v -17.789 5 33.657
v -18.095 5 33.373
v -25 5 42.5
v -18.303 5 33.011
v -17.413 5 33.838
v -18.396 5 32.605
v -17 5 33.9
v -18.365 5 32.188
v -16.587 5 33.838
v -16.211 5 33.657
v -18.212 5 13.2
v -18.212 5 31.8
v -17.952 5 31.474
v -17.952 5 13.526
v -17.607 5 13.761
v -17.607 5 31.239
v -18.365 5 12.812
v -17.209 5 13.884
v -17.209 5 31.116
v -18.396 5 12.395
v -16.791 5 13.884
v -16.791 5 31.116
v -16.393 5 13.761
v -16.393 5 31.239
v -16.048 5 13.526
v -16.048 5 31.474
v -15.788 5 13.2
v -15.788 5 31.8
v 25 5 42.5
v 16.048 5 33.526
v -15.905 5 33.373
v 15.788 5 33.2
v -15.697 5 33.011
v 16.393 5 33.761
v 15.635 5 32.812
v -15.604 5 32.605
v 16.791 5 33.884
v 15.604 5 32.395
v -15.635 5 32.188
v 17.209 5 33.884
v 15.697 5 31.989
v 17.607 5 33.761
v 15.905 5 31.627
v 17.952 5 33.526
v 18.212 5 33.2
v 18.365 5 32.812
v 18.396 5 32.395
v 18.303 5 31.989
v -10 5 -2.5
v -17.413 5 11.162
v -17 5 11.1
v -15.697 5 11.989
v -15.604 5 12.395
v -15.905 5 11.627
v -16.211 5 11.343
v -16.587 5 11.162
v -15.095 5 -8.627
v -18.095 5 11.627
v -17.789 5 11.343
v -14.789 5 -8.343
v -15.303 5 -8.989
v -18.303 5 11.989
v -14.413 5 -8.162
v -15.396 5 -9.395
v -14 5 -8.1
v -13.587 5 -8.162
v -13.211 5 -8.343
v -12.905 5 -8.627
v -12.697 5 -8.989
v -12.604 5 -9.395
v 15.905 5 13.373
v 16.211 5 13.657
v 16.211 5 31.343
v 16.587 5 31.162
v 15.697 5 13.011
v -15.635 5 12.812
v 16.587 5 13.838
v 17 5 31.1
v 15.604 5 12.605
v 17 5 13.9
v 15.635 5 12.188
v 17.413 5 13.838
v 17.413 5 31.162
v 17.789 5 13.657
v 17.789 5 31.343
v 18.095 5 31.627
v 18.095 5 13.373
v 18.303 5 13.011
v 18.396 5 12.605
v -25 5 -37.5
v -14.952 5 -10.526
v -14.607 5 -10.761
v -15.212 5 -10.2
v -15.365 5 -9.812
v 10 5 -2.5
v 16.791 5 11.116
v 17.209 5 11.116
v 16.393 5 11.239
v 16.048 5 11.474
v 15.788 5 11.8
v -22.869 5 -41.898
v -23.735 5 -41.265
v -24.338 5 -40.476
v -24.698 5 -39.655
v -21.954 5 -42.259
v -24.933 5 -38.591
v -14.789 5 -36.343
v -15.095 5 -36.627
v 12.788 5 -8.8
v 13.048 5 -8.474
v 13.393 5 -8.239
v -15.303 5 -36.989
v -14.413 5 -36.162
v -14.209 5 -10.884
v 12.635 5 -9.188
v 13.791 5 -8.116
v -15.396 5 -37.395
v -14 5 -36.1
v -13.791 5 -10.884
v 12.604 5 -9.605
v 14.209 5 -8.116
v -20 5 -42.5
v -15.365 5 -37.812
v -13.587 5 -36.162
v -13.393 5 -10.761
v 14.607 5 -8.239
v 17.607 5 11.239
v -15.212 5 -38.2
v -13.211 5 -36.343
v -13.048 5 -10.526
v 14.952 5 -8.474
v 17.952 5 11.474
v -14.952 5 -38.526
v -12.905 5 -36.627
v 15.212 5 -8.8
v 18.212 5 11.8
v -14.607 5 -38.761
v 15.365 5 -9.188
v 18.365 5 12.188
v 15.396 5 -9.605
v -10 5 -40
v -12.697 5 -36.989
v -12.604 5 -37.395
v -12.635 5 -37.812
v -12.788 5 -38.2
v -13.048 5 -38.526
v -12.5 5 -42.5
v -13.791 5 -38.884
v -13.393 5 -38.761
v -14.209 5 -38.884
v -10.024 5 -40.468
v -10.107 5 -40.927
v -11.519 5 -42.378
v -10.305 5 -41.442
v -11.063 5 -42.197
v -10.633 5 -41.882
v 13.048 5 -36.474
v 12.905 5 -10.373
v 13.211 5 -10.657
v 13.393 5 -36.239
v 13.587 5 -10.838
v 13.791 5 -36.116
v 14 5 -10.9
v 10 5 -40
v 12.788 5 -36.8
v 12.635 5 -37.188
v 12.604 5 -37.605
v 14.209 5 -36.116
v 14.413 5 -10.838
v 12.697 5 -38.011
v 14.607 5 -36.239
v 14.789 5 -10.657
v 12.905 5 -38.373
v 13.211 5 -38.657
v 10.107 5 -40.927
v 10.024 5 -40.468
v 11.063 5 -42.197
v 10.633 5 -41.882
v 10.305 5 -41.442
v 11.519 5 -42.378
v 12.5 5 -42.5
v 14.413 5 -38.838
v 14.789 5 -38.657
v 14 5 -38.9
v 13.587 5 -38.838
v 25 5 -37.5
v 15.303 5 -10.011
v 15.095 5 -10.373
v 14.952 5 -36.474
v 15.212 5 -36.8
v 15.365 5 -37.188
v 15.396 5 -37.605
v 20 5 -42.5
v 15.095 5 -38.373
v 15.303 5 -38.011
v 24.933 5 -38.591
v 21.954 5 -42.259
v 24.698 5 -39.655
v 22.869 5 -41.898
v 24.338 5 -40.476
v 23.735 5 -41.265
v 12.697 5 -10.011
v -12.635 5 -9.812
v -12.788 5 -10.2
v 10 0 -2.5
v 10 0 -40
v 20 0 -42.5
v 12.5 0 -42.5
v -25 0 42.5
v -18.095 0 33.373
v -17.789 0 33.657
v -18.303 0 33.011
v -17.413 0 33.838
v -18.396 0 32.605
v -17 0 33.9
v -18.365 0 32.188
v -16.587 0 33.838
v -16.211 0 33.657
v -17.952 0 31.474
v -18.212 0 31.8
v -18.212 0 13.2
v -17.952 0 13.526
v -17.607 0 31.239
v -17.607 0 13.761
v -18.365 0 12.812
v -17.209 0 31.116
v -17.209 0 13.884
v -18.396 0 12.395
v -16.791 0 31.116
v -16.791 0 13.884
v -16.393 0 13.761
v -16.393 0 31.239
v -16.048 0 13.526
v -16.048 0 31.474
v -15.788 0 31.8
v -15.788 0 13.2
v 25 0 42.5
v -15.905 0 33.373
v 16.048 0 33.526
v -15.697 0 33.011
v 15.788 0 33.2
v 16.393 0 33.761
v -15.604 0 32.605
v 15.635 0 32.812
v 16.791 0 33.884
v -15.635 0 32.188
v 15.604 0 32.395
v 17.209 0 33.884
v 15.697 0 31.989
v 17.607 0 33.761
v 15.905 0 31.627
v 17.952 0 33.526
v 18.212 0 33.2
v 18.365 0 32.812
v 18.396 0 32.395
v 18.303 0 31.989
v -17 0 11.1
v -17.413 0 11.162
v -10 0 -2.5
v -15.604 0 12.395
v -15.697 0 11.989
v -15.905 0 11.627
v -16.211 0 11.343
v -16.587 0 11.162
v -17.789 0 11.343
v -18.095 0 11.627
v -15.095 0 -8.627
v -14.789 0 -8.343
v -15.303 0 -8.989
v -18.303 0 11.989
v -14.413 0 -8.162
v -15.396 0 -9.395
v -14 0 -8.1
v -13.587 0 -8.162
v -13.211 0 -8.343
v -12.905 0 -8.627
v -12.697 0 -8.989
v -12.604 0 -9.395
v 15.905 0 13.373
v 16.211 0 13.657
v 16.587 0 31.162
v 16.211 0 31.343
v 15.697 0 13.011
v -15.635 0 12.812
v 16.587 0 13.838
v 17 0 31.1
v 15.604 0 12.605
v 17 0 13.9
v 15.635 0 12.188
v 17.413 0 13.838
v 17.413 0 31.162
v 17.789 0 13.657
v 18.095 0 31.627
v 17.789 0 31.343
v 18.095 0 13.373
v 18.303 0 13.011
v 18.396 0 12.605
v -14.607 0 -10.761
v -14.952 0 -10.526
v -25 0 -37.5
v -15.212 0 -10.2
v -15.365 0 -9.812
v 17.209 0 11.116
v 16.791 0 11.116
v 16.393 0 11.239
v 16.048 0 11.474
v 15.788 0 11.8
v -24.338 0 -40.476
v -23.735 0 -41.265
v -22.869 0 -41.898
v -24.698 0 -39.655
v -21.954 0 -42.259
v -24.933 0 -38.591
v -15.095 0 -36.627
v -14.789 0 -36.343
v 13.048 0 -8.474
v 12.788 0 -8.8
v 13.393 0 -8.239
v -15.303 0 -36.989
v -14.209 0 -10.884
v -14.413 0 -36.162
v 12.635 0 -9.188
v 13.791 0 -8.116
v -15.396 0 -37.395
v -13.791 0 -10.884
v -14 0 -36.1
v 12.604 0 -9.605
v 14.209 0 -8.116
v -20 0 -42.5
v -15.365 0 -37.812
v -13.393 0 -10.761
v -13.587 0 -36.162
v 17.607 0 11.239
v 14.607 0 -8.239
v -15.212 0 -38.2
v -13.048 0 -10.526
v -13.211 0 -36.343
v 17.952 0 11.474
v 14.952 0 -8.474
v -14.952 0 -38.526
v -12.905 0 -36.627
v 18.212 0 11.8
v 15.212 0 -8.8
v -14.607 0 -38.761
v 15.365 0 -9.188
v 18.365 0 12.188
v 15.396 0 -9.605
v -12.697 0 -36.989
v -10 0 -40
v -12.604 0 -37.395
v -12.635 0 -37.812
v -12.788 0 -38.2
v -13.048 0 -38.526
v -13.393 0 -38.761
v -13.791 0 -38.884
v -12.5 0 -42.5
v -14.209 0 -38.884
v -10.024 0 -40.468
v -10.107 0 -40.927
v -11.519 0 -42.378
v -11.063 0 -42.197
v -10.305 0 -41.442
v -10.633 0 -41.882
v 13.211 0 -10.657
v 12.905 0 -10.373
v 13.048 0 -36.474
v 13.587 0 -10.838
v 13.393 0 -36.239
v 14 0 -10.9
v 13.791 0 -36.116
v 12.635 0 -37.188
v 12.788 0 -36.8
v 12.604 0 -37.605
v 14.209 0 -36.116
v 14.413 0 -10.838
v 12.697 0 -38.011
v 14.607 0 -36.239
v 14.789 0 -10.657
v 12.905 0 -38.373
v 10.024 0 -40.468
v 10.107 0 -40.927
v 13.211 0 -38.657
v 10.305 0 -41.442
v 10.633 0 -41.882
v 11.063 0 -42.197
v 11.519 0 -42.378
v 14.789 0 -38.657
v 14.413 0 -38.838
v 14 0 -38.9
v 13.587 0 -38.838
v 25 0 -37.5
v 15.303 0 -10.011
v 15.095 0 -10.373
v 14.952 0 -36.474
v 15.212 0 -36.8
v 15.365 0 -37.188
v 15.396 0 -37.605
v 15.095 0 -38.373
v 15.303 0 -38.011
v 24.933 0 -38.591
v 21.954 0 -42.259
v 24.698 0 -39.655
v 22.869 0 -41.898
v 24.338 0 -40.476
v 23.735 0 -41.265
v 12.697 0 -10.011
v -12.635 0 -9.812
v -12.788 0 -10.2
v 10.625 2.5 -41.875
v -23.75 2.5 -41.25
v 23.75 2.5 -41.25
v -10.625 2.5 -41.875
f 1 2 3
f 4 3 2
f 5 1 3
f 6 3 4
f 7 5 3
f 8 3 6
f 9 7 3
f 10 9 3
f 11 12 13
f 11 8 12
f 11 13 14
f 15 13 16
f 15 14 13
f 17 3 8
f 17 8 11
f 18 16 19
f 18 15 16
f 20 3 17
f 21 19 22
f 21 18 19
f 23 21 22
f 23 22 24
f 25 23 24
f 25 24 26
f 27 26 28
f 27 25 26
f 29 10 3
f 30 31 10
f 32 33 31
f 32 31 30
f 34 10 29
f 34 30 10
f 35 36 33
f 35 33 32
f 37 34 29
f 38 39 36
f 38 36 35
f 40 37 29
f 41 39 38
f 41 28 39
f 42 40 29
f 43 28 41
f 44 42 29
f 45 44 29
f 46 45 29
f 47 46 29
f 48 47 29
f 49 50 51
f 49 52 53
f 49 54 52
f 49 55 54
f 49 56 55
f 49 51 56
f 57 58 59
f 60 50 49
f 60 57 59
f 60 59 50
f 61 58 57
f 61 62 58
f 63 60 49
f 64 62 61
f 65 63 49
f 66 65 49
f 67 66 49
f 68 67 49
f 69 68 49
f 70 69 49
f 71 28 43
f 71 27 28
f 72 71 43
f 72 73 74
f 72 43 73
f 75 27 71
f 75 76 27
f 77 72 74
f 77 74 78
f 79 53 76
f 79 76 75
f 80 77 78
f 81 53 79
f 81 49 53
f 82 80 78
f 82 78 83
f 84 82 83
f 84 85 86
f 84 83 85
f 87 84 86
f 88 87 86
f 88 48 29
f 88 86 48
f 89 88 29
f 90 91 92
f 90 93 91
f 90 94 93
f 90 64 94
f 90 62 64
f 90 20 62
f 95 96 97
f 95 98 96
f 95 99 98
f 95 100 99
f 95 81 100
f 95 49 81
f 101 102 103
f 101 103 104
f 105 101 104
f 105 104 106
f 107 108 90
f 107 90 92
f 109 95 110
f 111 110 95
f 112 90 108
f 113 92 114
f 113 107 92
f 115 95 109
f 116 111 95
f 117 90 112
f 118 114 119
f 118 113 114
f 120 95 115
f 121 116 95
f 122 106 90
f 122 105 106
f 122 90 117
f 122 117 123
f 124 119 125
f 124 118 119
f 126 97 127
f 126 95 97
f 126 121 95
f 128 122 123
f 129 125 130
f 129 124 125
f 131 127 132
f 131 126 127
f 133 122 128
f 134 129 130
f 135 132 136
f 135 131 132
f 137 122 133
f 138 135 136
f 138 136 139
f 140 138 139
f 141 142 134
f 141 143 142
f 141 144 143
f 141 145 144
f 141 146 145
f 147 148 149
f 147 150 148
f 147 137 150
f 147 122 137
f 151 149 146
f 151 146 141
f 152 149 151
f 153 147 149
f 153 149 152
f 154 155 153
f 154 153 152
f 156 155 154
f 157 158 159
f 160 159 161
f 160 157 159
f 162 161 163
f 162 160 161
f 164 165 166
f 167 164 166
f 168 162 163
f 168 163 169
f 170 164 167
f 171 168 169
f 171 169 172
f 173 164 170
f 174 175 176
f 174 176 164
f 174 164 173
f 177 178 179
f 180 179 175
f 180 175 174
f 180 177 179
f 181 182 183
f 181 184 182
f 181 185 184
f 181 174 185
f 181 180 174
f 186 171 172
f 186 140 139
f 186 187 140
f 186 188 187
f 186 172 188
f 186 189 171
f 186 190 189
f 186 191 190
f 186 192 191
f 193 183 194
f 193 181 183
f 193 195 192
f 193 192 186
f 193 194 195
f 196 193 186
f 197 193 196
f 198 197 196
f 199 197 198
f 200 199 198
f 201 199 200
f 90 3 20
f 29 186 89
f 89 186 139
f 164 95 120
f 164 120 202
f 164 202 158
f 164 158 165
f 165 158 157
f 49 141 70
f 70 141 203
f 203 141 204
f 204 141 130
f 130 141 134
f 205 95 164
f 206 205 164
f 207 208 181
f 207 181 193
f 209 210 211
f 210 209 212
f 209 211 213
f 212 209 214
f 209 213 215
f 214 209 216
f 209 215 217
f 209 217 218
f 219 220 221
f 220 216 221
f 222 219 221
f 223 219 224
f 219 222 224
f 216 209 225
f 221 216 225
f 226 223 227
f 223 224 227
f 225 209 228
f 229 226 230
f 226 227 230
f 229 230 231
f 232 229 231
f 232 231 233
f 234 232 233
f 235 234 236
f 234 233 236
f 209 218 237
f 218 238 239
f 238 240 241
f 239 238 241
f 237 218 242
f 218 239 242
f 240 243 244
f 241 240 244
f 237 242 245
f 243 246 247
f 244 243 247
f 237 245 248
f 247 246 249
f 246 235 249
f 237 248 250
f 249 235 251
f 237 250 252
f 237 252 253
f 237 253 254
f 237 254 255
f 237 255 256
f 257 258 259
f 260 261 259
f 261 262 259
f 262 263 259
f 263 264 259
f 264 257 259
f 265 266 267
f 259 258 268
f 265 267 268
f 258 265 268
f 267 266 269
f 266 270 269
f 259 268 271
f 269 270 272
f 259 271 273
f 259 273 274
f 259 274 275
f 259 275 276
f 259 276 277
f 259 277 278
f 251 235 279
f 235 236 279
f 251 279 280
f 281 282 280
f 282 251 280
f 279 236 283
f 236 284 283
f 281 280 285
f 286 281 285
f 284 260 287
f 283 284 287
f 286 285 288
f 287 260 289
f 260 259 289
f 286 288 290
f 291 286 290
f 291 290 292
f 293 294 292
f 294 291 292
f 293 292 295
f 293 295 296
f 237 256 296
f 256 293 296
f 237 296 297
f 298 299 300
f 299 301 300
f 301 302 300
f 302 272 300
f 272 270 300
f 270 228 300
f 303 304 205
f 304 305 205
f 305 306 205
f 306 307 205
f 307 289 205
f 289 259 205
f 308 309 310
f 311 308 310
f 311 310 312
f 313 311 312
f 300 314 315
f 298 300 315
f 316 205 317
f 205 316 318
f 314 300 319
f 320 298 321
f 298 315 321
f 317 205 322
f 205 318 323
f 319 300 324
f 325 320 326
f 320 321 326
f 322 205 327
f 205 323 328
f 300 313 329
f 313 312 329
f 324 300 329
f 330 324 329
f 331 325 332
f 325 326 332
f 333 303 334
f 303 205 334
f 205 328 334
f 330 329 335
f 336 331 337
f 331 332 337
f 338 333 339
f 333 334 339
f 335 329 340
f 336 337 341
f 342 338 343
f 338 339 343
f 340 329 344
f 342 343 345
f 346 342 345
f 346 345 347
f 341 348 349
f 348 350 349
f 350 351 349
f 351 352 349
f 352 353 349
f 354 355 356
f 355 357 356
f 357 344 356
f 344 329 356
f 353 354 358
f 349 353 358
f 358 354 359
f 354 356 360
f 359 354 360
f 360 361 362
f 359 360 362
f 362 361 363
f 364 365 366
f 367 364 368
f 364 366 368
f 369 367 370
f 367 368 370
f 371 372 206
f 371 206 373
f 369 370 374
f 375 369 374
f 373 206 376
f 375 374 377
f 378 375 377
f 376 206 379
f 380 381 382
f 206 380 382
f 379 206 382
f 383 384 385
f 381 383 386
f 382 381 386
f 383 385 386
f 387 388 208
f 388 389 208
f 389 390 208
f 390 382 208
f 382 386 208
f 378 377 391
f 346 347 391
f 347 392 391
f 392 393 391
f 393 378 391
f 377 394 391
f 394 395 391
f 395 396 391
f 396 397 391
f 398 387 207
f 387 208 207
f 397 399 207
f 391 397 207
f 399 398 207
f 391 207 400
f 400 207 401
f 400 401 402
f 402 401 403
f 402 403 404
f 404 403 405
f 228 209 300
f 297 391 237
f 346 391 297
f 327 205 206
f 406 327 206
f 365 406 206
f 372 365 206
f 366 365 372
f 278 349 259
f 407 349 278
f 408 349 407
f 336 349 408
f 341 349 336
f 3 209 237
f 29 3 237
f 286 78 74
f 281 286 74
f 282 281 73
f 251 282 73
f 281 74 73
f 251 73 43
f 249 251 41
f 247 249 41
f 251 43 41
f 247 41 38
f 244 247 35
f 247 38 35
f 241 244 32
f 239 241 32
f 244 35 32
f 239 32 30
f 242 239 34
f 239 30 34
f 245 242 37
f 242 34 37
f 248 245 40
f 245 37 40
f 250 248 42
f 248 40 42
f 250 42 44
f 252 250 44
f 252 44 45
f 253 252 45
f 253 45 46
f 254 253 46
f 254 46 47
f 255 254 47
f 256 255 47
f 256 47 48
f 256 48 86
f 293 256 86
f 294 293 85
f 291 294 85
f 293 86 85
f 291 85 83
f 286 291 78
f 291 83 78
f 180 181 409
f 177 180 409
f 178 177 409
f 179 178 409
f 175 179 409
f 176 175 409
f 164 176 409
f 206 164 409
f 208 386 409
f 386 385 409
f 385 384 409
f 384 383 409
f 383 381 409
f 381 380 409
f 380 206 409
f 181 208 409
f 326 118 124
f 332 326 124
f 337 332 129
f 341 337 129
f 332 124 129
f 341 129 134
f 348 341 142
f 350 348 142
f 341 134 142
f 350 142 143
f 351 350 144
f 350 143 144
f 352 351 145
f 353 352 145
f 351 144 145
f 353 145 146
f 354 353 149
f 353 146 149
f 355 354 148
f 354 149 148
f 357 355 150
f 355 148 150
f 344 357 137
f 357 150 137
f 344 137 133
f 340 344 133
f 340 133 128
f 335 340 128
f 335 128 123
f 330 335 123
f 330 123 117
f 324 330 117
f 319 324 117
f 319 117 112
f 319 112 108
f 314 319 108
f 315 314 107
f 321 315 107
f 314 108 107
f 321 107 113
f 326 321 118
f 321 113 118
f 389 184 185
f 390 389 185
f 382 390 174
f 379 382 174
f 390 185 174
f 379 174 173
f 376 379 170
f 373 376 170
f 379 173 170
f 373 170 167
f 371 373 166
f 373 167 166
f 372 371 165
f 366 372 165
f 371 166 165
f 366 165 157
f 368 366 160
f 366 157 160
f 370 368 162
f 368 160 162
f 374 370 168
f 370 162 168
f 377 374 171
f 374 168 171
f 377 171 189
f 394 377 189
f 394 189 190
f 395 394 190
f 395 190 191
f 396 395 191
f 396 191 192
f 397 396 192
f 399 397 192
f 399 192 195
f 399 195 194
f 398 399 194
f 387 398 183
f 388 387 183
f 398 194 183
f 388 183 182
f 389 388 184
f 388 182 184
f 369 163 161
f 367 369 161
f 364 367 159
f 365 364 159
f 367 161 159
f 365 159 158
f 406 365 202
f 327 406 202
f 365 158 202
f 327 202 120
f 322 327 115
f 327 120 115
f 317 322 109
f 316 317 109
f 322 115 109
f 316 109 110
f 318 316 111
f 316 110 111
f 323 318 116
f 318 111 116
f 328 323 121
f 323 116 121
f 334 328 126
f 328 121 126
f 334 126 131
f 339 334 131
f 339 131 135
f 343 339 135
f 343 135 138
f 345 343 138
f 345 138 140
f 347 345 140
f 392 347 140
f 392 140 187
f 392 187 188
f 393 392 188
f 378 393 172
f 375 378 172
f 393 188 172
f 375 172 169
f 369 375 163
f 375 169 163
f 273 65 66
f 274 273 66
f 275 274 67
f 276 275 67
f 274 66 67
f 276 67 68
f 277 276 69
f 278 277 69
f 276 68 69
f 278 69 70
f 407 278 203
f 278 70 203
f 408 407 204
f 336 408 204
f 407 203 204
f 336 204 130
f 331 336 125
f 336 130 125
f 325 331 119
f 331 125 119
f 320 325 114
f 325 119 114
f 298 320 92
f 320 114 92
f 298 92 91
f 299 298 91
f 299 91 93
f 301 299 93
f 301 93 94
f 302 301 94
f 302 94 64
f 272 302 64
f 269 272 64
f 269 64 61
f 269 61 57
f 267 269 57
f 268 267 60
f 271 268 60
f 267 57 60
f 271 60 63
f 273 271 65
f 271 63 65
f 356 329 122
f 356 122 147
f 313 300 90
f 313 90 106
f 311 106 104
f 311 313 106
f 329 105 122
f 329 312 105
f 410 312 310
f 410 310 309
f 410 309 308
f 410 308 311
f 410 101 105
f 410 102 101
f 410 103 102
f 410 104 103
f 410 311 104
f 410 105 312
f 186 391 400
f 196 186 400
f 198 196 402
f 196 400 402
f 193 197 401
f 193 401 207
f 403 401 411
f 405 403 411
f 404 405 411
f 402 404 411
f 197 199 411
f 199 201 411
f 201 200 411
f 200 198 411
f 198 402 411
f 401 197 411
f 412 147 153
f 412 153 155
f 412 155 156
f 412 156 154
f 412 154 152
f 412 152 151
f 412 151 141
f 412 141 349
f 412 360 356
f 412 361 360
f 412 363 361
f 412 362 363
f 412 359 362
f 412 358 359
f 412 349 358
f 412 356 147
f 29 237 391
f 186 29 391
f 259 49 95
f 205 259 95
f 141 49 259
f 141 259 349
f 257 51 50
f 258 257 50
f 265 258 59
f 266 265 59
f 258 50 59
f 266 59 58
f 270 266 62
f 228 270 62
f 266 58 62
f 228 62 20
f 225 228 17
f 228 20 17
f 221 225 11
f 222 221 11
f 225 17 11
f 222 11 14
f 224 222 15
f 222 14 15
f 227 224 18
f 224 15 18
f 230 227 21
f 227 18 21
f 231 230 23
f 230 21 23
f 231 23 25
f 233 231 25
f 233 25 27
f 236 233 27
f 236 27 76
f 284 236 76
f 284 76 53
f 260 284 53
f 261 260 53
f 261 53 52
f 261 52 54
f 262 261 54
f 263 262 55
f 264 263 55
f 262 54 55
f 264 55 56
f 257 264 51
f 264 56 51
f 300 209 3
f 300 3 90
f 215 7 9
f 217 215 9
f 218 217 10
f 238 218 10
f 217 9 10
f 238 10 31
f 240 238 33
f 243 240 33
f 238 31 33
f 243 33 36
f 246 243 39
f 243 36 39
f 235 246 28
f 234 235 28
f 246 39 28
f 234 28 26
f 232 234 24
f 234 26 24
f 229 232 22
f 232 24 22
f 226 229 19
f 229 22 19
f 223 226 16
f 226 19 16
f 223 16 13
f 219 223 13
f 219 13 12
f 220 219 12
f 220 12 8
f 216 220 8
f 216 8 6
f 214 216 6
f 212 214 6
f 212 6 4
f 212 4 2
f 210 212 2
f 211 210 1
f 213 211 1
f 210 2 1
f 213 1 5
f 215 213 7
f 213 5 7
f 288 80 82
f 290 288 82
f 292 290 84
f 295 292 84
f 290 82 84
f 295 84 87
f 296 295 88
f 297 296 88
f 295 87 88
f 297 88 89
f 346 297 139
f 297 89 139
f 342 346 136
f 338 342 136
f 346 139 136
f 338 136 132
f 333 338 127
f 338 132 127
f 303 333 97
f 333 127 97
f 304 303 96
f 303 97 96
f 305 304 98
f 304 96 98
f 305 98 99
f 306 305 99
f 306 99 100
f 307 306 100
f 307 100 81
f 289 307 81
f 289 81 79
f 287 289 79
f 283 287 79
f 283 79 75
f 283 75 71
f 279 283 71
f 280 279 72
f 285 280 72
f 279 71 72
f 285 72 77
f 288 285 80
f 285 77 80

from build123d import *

# Parameters (mm, degrees)
SKETCH1_W           = 50
SKETCH1_H           = 85
BOSS_EXTRUDE1_DEPTH = 5
SKETCH2_R           = 1.4
CUT_EXTRUDE1_DEPTH  = 5
SKETCH3_W           = 20
SKETCH3_H           = 40
CUT_EXTRUDE2_DEPTH  = 5
FILLET3_SIZE        = 5
FILLET4_SIZE        = 5
FILLET5_SIZE        = 2.5
FILLET6_SIZE        = 2.5
SKETCH4_R           = 1.4
CUT_EXTRUDE3_DEPTH  = 5


with BuildPart() as part:
    # Sketch1 → Boss-Extrude1 (new body)
    with BuildSketch(Plane(origin=(0, 0, 0), x_dir=(1, 0, 0), z_dir=(0, 1, 0))):
        Rectangle(SKETCH1_W, SKETCH1_H)
    extrude(amount=BOSS_EXTRUDE1_DEPTH)

    # Sketch2 → Cut-Extrude1 (cut)
    with BuildSketch(Plane(origin=(0, 5, 0), x_dir=(1, 0, 0), z_dir=(0, 1, 0))):
        with Locations(Location((-14, 37.5, 0), (0, 0, 270))):
            Circle(SKETCH2_R)
        with Locations(Location((14, 37.5, 0), (0, 0, 90))):
            Circle(SKETCH2_R)
        with Locations(Location((-14, 9.5, 0), (0, 0, 270))):
            Circle(SKETCH2_R)
        with Locations(Location((14, 9.5, 0), (0, 0, 90))):
            Circle(SKETCH2_R)
    extrude(amount=-CUT_EXTRUDE1_DEPTH, mode=Mode.SUBTRACT)

    # Sketch3 → Cut-Extrude2 (cut)
    with BuildSketch(Plane(origin=(0, 5, 0), x_dir=(1, 0, 0), z_dir=(0, 1, 0))):
        with Locations((0, 22.5)):
            Rectangle(SKETCH3_W, SKETCH3_H)
    extrude(amount=-CUT_EXTRUDE2_DEPTH, mode=Mode.SUBTRACT)

    # Fillet3
    # a fillet whose section is not a circle: 5 mm, written as the material it takes off along each edge
    with BuildSketch(Plane(origin=(-25, -12.5, -42.5), x_dir=(0, 0, 1), z_dir=(0, 1, 0))) as fillet3_piece_1:
        with BuildLine():
            Bezier((FILLET3_SIZE, 0), (0, 0), (0, FILLET3_SIZE), weights=[1, 1, 1])
            Line((0, FILLET3_SIZE), (0, 0))
            Line((0, 0), (FILLET3_SIZE, 0))
        make_face()
    extrude(amount=30, mode=Mode.SUBTRACT)

    # Fillet4
    # a fillet whose section is not a circle: 5 mm, written as the material it takes off along each edge
    with BuildSketch(Plane(origin=(25, -12.5, -42.5), x_dir=(0, 0, 1), z_dir=(0, 1, 0))) as fillet4_piece_1:
        with BuildLine():
            Bezier((FILLET4_SIZE, 0), (0, 0), (0, -FILLET4_SIZE), weights=[1, 1, 1])
            Line((0, -FILLET4_SIZE), (0, 0))
            Line((0, 0), (FILLET4_SIZE, 0))
        make_face()
    extrude(amount=30, mode=Mode.SUBTRACT)

    # Fillet5
    # a fillet whose section is not a circle: 2.5 mm, written as the material it takes off along each edge
    with BuildSketch(Plane(origin=(-10, 11.25, -42.5), x_dir=(0, 0, 1), z_dir=(0, -1, 0))) as fillet5_piece_1:
        with BuildLine():
            Bezier((FILLET5_SIZE, 0), (0, 0), (0, FILLET5_SIZE), weights=[1, 1, 1])
            Line((0, FILLET5_SIZE), (0, 0))
            Line((0, 0), (FILLET5_SIZE, 0))
        make_face()
    extrude(amount=17.5, mode=Mode.SUBTRACT)

    # Fillet6
    # a fillet whose section is not a circle: 2.5 mm, written as the material it takes off along each edge
    with BuildSketch(Plane(origin=(10, 11.25, -42.5), x_dir=(0, 0, 1), z_dir=(0, -1, 0))) as fillet6_piece_1:
        with BuildLine():
            Bezier((FILLET6_SIZE, 0), (0, 0), (0, -FILLET6_SIZE), weights=[1, 1, 1])
            Line((0, -FILLET6_SIZE), (0, 0))
            Line((0, 0), (FILLET6_SIZE, 0))
        make_face()
    extrude(amount=17.5, mode=Mode.SUBTRACT)

    # Sketch4 → Cut-Extrude3 (cut)
    with BuildSketch(Plane(origin=(0, 5, 0), x_dir=(1, 0, 0), z_dir=(0, 1, 0))):
        with Locations(Location((-17, -32.5, 0), (0, 0, 270))):
            Circle(SKETCH4_R)
        with Locations(Location((17, -32.5, 0), (0, 0, 90))):
            Circle(SKETCH4_R)
        with Locations(Location((17, -12.5, 0), (0, 0, 270))):
            Circle(SKETCH4_R)
        with Locations(Location((-17, -12.5, 0), (0, 0, 90))):
            Circle(SKETCH4_R)
    extrude(amount=-CUT_EXTRUDE3_DEPTH, mode=Mode.SUBTRACT)


solid = part.part
